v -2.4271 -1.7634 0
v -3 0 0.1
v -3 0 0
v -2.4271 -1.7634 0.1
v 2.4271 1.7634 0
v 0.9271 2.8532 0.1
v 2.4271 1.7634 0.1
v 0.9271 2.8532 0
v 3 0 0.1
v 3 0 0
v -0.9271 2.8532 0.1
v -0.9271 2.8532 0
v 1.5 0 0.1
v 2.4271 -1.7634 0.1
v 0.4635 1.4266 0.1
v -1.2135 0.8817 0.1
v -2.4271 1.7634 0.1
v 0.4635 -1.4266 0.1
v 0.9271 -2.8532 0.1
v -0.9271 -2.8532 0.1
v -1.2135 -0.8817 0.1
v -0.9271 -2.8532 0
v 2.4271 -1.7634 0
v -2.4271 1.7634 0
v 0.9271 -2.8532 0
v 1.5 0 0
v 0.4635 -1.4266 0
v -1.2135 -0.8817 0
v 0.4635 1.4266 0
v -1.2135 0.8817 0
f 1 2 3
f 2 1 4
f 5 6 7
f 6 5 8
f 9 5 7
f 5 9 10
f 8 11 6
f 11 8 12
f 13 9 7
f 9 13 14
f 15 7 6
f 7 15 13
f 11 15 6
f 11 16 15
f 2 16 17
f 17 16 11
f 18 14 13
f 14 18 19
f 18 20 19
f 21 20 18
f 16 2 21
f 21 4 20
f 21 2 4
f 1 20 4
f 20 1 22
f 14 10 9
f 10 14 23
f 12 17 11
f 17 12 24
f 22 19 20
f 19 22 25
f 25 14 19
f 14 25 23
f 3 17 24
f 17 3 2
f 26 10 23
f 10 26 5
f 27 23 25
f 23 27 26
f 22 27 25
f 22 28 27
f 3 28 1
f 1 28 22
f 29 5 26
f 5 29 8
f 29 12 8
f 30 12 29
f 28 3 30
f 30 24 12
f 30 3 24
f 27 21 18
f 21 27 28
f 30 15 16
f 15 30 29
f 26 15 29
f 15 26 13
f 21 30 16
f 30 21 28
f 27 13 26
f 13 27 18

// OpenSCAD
color("pink") shimring(6, 3, 0.1);

module shimring(gaikei, naikei,t){
  difference(){
    cylinder(h=t, d=gaikei);
    cylinder(h=t, d=naikei);
  }
}
